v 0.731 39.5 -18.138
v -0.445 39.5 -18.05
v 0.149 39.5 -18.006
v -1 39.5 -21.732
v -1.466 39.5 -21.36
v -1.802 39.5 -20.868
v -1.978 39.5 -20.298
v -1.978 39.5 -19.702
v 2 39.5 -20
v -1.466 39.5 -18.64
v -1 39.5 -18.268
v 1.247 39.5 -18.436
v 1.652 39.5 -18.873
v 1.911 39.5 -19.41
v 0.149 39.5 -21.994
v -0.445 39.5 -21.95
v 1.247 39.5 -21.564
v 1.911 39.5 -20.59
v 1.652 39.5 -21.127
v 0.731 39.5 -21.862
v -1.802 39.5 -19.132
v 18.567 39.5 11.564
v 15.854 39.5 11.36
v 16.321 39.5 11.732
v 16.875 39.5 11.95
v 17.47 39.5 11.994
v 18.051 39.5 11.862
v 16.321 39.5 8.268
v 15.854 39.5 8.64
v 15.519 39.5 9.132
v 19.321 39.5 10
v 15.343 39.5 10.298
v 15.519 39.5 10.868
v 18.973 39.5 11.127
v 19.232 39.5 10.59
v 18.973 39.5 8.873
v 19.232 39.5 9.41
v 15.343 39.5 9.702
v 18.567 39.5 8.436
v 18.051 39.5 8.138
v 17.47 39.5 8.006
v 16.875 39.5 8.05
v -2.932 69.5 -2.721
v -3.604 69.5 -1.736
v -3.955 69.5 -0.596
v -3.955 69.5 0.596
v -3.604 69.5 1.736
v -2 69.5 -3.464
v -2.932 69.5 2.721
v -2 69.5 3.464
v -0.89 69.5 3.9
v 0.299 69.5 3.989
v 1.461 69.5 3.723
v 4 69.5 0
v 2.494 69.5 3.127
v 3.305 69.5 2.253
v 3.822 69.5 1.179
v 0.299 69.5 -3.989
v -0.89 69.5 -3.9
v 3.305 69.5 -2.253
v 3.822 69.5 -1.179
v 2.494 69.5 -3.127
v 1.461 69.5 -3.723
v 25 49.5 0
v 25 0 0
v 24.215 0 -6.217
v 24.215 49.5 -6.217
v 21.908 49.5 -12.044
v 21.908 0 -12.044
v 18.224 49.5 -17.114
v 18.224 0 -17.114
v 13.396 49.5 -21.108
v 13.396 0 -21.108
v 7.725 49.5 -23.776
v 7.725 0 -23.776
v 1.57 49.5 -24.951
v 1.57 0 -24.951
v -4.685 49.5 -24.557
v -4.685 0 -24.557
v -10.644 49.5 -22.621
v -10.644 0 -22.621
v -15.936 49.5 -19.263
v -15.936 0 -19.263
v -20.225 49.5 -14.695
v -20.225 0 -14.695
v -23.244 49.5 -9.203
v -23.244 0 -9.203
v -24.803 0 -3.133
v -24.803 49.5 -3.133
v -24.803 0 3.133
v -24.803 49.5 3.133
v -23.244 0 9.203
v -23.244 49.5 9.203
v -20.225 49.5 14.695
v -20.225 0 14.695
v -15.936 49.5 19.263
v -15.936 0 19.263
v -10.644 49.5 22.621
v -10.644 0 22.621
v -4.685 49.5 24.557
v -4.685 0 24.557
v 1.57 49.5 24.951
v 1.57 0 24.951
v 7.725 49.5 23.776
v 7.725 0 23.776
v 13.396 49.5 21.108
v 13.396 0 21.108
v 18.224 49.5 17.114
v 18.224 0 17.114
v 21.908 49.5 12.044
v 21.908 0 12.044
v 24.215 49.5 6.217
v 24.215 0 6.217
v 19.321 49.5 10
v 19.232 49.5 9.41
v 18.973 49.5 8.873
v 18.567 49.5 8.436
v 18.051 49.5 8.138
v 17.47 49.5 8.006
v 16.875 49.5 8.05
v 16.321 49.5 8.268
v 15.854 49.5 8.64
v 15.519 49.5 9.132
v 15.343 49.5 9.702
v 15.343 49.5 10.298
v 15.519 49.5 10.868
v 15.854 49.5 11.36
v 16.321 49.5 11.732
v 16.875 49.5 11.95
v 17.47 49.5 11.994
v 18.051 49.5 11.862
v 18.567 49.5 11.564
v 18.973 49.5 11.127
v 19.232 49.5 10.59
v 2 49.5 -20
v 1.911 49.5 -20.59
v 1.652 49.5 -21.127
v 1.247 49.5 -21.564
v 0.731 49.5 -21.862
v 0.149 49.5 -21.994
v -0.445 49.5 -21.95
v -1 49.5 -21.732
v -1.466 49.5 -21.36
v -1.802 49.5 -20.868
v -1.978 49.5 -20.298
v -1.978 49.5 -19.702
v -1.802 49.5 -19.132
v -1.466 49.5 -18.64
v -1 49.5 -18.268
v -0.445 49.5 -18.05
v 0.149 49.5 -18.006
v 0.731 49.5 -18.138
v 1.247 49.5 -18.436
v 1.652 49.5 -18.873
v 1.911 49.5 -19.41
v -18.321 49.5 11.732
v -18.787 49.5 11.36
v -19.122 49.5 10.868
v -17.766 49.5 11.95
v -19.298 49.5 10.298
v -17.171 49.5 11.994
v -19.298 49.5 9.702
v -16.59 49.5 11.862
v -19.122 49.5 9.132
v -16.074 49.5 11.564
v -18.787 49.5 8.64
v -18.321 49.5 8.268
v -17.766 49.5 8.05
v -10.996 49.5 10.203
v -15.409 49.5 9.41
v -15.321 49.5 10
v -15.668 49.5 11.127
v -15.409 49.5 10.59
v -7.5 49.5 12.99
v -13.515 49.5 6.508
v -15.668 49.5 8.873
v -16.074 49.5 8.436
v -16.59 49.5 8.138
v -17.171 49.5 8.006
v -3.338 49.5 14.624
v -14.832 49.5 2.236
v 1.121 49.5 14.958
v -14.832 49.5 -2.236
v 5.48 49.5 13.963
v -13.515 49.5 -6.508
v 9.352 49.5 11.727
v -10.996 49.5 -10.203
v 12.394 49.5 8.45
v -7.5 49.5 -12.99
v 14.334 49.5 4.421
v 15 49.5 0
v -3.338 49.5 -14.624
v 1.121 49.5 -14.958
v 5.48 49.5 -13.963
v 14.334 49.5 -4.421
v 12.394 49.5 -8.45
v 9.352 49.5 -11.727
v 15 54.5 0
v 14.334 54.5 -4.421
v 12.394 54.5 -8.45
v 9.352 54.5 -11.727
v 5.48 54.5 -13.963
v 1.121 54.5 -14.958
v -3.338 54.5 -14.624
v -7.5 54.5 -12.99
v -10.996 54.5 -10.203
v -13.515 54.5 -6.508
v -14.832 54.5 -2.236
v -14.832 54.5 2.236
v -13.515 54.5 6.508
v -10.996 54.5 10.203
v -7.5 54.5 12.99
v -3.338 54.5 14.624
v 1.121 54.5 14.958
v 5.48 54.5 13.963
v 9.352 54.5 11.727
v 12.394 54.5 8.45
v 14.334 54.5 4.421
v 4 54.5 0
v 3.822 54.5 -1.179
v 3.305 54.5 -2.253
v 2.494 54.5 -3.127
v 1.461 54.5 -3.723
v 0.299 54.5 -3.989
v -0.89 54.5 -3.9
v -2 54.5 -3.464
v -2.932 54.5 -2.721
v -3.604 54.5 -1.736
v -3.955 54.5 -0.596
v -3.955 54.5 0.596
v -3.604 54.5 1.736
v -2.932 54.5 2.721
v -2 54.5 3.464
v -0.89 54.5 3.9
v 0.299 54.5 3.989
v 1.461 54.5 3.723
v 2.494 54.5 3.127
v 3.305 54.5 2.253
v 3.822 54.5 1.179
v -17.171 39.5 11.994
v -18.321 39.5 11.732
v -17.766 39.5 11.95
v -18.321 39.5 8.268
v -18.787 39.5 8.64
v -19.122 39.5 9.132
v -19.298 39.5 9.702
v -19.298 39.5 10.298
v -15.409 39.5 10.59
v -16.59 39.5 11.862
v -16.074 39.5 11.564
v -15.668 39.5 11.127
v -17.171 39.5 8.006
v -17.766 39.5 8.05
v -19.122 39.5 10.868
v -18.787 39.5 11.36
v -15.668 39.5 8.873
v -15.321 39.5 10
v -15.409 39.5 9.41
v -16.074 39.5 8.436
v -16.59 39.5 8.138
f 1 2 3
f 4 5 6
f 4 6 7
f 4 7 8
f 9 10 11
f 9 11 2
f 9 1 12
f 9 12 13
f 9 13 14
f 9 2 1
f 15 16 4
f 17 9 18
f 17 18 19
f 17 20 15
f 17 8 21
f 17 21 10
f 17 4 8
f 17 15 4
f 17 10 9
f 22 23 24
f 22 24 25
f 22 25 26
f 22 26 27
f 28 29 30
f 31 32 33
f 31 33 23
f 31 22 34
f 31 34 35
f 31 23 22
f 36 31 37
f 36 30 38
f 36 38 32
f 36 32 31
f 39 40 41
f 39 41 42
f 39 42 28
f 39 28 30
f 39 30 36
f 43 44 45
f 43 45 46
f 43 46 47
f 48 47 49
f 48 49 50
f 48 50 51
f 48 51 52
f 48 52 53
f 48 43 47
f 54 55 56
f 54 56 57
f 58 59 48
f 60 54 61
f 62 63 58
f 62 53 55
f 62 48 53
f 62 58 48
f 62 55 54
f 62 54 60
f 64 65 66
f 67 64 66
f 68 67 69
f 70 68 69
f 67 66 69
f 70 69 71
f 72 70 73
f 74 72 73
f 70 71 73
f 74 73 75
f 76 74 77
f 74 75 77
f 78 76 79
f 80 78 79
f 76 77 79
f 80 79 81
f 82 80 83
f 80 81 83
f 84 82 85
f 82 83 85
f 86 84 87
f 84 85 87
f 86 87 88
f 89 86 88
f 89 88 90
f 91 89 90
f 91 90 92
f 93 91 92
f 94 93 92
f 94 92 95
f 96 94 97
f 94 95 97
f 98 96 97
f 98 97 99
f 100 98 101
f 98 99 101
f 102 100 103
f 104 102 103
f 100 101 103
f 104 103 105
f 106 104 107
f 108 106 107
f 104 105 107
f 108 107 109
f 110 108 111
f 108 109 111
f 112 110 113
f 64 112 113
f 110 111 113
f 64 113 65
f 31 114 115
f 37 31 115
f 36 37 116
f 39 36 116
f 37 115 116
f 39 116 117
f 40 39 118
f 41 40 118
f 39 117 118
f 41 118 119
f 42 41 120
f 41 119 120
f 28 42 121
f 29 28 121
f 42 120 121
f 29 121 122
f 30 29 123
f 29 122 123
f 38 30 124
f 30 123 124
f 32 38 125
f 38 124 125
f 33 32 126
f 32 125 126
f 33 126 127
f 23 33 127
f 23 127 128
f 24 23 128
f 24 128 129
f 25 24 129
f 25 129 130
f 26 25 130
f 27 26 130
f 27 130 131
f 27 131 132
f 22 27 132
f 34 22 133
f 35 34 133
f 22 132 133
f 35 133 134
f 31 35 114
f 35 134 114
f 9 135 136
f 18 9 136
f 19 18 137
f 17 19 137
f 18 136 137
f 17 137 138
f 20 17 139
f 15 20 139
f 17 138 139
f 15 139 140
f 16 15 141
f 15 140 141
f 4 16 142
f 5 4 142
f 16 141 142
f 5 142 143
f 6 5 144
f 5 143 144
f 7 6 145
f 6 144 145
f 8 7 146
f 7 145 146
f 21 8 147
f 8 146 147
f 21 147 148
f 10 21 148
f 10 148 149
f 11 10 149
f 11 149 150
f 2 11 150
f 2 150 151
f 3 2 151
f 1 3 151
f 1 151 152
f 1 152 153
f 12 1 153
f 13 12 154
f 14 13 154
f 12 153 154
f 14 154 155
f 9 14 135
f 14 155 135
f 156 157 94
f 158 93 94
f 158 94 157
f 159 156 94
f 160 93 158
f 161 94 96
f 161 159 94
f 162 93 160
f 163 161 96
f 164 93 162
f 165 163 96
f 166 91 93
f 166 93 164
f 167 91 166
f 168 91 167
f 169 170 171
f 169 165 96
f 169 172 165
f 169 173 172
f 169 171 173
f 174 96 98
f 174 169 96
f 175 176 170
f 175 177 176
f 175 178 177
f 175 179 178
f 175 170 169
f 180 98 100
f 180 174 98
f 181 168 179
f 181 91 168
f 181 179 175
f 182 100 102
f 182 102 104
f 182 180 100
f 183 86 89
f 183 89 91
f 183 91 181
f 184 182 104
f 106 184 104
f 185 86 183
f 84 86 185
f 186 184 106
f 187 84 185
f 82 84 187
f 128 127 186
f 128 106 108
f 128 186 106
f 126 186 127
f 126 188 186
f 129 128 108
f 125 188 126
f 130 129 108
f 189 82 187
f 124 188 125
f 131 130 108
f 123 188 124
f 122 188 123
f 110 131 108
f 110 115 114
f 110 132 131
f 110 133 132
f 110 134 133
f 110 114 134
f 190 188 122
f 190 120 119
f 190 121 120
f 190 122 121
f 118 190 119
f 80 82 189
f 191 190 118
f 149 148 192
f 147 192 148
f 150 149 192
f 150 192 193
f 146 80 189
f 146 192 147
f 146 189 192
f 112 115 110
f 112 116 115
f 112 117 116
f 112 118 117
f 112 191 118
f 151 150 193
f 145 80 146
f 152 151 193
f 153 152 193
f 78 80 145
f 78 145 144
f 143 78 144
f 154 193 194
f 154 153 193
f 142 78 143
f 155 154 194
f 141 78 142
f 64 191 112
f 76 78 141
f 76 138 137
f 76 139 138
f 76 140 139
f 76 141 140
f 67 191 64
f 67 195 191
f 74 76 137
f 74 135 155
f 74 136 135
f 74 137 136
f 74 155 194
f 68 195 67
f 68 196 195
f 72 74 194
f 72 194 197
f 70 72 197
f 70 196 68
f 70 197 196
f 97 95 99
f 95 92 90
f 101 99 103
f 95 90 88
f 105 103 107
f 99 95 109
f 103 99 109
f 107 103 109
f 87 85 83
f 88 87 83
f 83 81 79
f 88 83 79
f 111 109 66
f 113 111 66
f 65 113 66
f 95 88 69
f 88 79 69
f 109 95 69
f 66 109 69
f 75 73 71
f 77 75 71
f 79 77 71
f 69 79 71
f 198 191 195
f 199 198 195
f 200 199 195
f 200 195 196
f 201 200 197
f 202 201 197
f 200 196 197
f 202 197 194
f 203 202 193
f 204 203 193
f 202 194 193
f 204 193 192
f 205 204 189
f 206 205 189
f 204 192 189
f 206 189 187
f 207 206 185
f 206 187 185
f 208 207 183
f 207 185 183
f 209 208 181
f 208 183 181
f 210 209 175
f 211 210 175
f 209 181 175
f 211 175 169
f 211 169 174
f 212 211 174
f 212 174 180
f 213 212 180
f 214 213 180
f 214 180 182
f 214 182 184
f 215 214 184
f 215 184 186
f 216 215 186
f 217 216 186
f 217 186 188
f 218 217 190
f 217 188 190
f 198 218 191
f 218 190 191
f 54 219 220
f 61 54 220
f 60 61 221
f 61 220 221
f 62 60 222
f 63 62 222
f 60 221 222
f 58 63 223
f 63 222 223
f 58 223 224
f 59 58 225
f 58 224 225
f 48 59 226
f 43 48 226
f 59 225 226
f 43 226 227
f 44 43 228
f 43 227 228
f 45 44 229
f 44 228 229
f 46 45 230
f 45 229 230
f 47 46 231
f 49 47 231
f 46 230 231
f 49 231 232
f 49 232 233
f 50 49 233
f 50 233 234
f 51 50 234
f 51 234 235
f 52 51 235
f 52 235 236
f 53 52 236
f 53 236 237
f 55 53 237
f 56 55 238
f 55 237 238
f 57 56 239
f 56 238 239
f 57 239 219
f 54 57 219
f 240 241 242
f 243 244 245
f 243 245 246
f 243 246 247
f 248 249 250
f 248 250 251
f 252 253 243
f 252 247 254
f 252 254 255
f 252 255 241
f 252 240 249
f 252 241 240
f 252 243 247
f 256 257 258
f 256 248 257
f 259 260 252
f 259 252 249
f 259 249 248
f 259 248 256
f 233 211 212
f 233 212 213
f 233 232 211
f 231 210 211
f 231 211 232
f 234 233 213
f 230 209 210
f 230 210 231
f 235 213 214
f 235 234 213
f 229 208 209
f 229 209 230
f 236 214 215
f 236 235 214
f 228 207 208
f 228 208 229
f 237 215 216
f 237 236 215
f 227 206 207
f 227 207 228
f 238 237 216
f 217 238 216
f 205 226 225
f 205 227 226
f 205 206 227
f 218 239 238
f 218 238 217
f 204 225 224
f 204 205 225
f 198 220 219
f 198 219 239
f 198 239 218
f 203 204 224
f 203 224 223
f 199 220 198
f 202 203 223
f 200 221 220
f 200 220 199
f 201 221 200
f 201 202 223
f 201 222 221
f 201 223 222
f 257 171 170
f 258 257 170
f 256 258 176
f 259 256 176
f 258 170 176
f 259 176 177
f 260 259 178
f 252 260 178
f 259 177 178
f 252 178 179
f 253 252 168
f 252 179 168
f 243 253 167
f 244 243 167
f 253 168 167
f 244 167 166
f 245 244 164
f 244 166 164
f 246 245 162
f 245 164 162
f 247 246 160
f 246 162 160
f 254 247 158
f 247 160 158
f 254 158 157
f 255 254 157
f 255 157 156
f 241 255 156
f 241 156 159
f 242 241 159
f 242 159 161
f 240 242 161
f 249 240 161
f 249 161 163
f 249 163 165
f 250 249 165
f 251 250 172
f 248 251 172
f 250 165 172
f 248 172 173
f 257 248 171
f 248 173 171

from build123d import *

# Parameters (mm, degrees)
SKETCH1_R           = 25
BOSS_EXTRUDE1_DEPTH = 49.5
SKETCH2_R           = 15
BOSS_EXTRUDE2_DEPTH = 5
SKETCH3_R           = 4
BOSS_EXTRUDE3_DEPTH = 15
SKETCH4_R           = 2
CUT_EXTRUDE1_DEPTH  = 10


with BuildPart() as part:
    # Sketch1 → Boss-Extrude1 (new body)
    with BuildSketch(Plane(origin=(0, 0, 0), x_dir=(1, 0, 0), z_dir=(0, 1, 0))):
        Circle(SKETCH1_R)
    extrude(amount=BOSS_EXTRUDE1_DEPTH)

    # Sketch2 → Boss-Extrude2 (add)
    with BuildSketch(Plane(origin=(0, 49.5, 0), x_dir=(1, 0, 0), z_dir=(0, 1, 0))):
        Circle(SKETCH2_R)
    extrude(amount=BOSS_EXTRUDE2_DEPTH)

    # Sketch3 → Boss-Extrude3 (add)
    with BuildSketch(Plane(origin=(0, 54.5, 0), x_dir=(1, 0, 0), z_dir=(0, 1, 0))):
        Circle(SKETCH3_R)
    extrude(amount=BOSS_EXTRUDE3_DEPTH)

    # Sketch4 → Cut-Extrude1 (cut)
    with BuildSketch(Plane(origin=(0, 49.5, 0), x_dir=(1, 0, 0), z_dir=(0, 1, 0))):
        with Locations((0, 20)):
            Circle(SKETCH4_R)
        with Locations((17.320508076, -10)):
            Circle(SKETCH4_R)
        with Locations((-17.320508076, -10)):
            Circle(SKETCH4_R)
    extrude(amount=-CUT_EXTRUDE1_DEPTH, mode=Mode.SUBTRACT)


solid = part.part
